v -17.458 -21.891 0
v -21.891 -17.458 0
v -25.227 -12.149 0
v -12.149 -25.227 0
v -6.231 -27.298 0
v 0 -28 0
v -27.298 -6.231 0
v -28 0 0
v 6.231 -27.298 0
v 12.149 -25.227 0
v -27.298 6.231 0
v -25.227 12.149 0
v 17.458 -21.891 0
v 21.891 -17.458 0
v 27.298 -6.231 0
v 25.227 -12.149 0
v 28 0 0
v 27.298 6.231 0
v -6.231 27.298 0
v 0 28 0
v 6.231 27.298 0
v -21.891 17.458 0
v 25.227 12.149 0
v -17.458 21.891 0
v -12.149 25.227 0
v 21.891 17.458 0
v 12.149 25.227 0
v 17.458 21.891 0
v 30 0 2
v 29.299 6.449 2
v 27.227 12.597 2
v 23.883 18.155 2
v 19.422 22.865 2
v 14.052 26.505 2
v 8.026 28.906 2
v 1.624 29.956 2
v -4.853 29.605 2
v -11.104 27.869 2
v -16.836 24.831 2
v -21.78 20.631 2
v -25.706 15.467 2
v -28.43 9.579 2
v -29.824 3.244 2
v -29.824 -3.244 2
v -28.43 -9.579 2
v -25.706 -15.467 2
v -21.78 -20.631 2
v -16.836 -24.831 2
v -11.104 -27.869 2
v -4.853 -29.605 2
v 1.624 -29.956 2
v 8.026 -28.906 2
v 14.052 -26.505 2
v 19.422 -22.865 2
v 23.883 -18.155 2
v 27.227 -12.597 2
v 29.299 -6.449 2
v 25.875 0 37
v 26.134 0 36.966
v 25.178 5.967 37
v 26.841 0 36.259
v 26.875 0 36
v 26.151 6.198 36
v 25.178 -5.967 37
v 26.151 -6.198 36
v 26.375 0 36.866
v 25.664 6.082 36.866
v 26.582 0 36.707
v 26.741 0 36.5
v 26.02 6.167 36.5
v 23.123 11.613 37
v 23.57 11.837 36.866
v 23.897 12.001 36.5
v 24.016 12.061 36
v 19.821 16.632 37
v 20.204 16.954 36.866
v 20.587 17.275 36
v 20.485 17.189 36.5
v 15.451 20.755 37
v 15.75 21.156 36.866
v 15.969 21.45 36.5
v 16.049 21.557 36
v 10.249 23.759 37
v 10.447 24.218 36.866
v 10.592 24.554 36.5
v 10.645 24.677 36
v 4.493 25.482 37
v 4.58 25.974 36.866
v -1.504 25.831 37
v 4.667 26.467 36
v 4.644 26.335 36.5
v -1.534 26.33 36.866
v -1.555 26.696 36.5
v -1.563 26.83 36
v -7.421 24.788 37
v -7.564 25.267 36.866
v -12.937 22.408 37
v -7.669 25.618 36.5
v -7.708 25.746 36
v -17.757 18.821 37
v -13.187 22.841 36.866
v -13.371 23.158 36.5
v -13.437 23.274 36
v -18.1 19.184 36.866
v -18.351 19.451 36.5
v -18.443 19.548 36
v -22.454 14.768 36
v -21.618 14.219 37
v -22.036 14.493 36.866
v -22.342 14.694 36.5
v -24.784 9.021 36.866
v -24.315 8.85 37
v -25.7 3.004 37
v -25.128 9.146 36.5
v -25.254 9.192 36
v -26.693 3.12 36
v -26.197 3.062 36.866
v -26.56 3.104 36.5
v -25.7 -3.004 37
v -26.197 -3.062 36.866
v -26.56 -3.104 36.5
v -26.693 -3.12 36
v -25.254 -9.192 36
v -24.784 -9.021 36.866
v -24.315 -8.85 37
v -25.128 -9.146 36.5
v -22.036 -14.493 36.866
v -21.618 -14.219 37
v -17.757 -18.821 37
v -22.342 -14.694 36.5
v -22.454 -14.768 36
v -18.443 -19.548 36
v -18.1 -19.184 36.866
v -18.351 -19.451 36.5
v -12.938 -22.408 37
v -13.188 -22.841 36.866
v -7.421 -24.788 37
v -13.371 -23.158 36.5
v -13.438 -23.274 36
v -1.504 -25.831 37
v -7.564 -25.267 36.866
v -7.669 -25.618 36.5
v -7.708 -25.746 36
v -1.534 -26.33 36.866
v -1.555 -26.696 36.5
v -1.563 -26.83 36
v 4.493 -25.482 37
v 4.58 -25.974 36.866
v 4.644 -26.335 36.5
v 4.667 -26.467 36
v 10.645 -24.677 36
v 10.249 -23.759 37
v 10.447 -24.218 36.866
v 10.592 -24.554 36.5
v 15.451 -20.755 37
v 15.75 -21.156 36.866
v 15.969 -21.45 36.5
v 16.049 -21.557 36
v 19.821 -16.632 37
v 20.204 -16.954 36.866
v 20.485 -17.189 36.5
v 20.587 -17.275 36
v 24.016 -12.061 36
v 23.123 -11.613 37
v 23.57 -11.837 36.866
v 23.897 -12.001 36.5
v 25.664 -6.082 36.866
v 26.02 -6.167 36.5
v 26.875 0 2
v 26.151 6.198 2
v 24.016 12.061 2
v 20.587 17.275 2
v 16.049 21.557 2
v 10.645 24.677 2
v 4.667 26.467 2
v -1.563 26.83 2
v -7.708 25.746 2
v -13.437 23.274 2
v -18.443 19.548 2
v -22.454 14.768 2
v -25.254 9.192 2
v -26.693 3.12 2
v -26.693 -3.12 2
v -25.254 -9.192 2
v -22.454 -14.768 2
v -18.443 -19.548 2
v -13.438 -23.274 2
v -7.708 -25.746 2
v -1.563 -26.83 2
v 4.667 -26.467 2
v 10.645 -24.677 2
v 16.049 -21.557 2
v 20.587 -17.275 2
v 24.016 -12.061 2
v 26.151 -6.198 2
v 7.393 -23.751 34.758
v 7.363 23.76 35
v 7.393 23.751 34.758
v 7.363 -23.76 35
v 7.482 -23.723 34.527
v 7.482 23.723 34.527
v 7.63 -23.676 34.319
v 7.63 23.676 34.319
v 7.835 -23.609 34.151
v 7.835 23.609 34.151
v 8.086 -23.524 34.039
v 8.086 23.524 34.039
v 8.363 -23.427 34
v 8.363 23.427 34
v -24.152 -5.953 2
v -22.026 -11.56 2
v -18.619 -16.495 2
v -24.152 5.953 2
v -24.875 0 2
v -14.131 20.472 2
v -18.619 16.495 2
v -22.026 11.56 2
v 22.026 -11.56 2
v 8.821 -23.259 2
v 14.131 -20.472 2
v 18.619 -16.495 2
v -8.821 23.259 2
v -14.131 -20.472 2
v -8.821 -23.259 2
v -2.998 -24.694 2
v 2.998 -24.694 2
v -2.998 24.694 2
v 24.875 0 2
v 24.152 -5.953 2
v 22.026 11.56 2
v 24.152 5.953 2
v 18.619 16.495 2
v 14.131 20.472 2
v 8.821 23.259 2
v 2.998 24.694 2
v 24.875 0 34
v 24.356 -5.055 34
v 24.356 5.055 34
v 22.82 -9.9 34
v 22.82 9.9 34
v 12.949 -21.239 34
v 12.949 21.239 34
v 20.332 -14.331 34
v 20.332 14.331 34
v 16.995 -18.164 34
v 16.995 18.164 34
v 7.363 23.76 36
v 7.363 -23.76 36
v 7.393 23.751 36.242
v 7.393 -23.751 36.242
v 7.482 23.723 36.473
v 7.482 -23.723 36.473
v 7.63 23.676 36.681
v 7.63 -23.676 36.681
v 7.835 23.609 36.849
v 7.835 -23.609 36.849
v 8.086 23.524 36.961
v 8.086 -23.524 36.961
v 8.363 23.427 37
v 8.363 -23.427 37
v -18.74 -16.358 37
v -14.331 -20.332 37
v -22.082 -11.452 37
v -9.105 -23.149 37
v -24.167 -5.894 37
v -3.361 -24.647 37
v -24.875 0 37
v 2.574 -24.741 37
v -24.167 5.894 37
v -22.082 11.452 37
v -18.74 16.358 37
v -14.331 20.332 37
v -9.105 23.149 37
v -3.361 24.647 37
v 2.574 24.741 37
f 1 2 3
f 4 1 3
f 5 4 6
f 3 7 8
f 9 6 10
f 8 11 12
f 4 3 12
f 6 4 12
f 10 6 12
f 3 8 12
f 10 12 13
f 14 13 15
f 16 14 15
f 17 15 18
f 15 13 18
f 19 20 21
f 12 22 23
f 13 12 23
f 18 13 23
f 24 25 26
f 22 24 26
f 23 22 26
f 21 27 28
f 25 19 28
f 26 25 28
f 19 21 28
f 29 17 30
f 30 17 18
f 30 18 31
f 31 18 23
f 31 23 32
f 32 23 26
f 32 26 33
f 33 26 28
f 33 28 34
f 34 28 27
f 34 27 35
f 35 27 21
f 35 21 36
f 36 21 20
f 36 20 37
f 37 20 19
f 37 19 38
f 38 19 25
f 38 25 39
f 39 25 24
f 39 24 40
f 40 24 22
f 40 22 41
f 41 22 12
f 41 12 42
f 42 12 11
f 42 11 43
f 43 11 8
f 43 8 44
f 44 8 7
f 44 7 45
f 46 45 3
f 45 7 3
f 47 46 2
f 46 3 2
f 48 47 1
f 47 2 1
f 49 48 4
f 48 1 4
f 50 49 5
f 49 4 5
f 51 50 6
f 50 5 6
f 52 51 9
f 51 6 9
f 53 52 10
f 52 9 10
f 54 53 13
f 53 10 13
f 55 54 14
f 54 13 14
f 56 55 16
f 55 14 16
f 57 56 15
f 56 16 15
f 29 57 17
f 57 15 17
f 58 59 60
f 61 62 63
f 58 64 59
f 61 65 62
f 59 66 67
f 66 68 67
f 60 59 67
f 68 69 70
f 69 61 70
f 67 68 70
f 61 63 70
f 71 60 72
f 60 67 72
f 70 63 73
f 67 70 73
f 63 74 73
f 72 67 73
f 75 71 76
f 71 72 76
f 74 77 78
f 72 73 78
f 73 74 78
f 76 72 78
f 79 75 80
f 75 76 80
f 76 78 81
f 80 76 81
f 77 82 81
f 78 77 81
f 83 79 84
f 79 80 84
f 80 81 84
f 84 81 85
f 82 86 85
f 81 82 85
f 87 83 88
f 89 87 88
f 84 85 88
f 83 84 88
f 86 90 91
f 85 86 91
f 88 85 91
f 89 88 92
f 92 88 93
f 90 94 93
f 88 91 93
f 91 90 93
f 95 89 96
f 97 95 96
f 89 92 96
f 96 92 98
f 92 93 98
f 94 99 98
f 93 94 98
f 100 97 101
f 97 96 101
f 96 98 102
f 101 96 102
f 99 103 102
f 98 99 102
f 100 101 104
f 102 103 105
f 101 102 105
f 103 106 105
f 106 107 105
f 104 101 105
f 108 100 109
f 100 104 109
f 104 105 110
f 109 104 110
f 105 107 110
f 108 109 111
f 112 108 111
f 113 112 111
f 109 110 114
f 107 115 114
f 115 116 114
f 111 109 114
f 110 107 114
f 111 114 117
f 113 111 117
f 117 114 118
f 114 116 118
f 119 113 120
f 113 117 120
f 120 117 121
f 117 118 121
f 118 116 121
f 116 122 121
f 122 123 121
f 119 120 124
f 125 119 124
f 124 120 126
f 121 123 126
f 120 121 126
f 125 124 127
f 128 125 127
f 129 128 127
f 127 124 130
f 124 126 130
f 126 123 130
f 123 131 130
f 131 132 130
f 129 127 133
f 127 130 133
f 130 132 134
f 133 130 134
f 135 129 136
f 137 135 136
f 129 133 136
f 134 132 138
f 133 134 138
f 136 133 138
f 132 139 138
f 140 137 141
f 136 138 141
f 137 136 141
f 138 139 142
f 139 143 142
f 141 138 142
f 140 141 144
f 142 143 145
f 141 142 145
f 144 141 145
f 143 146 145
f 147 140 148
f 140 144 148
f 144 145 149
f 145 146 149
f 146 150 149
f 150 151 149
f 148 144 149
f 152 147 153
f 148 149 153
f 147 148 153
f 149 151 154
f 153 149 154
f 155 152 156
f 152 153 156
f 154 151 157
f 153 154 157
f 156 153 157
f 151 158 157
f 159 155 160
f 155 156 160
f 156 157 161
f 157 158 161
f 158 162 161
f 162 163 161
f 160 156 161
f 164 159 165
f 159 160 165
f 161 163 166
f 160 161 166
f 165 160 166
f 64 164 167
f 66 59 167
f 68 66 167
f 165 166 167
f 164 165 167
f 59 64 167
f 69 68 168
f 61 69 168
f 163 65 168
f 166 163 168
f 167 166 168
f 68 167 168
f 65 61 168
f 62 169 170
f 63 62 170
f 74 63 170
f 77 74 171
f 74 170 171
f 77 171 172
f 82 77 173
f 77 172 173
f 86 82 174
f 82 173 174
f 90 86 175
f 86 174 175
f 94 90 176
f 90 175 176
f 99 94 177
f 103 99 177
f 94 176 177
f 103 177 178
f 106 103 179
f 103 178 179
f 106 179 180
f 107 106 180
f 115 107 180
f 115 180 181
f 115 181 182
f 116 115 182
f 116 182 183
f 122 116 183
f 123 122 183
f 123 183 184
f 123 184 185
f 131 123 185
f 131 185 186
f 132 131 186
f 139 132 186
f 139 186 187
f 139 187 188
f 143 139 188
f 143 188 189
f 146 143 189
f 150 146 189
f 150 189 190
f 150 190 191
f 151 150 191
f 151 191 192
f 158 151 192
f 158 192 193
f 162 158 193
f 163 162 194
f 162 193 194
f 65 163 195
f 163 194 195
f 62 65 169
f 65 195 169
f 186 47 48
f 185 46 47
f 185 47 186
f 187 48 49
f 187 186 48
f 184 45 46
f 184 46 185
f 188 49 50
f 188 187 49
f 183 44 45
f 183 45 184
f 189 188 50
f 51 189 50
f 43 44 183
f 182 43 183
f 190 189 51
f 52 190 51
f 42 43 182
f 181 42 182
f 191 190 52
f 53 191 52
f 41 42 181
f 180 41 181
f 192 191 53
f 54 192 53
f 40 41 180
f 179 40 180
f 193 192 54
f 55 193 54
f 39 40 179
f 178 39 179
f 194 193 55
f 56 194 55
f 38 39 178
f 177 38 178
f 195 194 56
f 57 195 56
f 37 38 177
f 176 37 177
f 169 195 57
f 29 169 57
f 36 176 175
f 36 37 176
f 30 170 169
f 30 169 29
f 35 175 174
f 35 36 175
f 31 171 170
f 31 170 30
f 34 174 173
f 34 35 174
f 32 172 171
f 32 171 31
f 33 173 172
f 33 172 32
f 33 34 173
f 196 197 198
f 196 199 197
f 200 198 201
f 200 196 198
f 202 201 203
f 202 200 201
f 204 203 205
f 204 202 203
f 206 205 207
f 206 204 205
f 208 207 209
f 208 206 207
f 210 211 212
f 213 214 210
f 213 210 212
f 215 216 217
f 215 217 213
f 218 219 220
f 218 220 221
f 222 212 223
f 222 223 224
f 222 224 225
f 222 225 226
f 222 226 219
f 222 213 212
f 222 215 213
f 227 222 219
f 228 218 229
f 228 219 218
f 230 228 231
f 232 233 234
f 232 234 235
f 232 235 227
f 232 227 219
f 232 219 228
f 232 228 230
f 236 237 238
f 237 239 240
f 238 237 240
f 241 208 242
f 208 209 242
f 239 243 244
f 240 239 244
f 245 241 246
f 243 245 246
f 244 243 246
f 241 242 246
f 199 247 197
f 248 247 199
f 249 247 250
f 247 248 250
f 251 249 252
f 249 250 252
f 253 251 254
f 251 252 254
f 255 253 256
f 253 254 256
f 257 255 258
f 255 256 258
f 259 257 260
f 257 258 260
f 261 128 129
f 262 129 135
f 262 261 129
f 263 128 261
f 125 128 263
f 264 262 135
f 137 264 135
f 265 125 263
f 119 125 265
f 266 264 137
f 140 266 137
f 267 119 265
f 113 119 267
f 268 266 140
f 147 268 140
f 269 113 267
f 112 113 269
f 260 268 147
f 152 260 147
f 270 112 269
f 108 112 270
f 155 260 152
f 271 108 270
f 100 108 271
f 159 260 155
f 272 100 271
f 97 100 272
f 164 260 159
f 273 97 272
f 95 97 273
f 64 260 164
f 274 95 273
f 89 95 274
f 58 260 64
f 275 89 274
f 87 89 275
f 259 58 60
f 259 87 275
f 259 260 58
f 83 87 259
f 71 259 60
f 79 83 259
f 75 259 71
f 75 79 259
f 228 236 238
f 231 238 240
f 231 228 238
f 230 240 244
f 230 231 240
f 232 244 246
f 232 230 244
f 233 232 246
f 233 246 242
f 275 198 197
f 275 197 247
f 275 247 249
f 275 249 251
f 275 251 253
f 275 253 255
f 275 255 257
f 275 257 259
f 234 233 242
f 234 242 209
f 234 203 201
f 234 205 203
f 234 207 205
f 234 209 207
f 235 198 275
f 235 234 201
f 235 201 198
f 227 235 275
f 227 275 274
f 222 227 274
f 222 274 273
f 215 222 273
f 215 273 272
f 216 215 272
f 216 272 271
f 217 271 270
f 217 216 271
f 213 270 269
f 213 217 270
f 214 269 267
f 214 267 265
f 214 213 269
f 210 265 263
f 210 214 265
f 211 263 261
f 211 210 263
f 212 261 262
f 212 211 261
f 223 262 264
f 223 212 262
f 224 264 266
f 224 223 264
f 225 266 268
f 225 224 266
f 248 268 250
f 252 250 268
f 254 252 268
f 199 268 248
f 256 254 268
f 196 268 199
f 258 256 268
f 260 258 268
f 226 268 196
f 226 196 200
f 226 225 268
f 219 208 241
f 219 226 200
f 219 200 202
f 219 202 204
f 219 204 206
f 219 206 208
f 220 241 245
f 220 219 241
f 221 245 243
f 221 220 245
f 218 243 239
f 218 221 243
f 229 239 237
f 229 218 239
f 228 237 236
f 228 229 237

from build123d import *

# Parameters (mm, degrees)
F0_R     = 26.875
F0_R_2   = 24.875
F1_DEPTH = 37
F0_R_3   = 30
F2_DEPTH = 2
F4_DEPTH = 3
F5_R     = 1
F6_SIZE  = 1.99999


# Not quite as in the source:
# - a fillet or chamfer is up to 0.001 mm smaller than in the source, because OpenCascade refuses the exact size


with BuildPart() as f1:
    # F0 (on Top) → F1 (new body)
    with BuildSketch(Plane.XY):
        Circle(F0_R)
        Circle(F0_R_2, mode=Mode.SUBTRACT)
    extrude(amount=F1_DEPTH)

    # F0 (on Top) → F2 (join)
    with BuildSketch(Plane.XY):
        Circle(F0_R_3)
        Circle(F0_R, mode=Mode.SUBTRACT)
        Circle(F0_R_2)
    extrude(amount=F2_DEPTH)

    # F3 (on face) → F4 (join)
    with BuildSketch(Plane.XY.offset(37)):
        with BuildLine():
            ThreePointArc((7.3629554948, -23.7603137896), (20.0239749167, -14.7582537427), (24.875, 0))
            ThreePointArc((24.875, 0), (20.0239749167, 14.7582537427), (7.3629554948, 23.7603137896))
            Line((7.3629554948, 23.7603137896), (7.3629554948, -23.7603137896))
        make_face()
    extrude(amount=-F4_DEPTH)

    # F5
    f5_edges = [f1.edges().sort_by_distance(p)[0] for p in [
        (7.362955, 0, 34),
        (7.362955, 0, 37),
        (-26.875, 0, 37),
    ]]
    fillet(f5_edges, radius=F5_R)

    # F6 (size 2 in the source; OpenCascade refuses exactly that, so slightly less here)
    f6_edges = [f1.edges().sort_by_distance(p)[0] for p in [
        (-30, 0, 0),
    ]]
    chamfer(f6_edges, length=F6_SIZE)


solid = f1.part
